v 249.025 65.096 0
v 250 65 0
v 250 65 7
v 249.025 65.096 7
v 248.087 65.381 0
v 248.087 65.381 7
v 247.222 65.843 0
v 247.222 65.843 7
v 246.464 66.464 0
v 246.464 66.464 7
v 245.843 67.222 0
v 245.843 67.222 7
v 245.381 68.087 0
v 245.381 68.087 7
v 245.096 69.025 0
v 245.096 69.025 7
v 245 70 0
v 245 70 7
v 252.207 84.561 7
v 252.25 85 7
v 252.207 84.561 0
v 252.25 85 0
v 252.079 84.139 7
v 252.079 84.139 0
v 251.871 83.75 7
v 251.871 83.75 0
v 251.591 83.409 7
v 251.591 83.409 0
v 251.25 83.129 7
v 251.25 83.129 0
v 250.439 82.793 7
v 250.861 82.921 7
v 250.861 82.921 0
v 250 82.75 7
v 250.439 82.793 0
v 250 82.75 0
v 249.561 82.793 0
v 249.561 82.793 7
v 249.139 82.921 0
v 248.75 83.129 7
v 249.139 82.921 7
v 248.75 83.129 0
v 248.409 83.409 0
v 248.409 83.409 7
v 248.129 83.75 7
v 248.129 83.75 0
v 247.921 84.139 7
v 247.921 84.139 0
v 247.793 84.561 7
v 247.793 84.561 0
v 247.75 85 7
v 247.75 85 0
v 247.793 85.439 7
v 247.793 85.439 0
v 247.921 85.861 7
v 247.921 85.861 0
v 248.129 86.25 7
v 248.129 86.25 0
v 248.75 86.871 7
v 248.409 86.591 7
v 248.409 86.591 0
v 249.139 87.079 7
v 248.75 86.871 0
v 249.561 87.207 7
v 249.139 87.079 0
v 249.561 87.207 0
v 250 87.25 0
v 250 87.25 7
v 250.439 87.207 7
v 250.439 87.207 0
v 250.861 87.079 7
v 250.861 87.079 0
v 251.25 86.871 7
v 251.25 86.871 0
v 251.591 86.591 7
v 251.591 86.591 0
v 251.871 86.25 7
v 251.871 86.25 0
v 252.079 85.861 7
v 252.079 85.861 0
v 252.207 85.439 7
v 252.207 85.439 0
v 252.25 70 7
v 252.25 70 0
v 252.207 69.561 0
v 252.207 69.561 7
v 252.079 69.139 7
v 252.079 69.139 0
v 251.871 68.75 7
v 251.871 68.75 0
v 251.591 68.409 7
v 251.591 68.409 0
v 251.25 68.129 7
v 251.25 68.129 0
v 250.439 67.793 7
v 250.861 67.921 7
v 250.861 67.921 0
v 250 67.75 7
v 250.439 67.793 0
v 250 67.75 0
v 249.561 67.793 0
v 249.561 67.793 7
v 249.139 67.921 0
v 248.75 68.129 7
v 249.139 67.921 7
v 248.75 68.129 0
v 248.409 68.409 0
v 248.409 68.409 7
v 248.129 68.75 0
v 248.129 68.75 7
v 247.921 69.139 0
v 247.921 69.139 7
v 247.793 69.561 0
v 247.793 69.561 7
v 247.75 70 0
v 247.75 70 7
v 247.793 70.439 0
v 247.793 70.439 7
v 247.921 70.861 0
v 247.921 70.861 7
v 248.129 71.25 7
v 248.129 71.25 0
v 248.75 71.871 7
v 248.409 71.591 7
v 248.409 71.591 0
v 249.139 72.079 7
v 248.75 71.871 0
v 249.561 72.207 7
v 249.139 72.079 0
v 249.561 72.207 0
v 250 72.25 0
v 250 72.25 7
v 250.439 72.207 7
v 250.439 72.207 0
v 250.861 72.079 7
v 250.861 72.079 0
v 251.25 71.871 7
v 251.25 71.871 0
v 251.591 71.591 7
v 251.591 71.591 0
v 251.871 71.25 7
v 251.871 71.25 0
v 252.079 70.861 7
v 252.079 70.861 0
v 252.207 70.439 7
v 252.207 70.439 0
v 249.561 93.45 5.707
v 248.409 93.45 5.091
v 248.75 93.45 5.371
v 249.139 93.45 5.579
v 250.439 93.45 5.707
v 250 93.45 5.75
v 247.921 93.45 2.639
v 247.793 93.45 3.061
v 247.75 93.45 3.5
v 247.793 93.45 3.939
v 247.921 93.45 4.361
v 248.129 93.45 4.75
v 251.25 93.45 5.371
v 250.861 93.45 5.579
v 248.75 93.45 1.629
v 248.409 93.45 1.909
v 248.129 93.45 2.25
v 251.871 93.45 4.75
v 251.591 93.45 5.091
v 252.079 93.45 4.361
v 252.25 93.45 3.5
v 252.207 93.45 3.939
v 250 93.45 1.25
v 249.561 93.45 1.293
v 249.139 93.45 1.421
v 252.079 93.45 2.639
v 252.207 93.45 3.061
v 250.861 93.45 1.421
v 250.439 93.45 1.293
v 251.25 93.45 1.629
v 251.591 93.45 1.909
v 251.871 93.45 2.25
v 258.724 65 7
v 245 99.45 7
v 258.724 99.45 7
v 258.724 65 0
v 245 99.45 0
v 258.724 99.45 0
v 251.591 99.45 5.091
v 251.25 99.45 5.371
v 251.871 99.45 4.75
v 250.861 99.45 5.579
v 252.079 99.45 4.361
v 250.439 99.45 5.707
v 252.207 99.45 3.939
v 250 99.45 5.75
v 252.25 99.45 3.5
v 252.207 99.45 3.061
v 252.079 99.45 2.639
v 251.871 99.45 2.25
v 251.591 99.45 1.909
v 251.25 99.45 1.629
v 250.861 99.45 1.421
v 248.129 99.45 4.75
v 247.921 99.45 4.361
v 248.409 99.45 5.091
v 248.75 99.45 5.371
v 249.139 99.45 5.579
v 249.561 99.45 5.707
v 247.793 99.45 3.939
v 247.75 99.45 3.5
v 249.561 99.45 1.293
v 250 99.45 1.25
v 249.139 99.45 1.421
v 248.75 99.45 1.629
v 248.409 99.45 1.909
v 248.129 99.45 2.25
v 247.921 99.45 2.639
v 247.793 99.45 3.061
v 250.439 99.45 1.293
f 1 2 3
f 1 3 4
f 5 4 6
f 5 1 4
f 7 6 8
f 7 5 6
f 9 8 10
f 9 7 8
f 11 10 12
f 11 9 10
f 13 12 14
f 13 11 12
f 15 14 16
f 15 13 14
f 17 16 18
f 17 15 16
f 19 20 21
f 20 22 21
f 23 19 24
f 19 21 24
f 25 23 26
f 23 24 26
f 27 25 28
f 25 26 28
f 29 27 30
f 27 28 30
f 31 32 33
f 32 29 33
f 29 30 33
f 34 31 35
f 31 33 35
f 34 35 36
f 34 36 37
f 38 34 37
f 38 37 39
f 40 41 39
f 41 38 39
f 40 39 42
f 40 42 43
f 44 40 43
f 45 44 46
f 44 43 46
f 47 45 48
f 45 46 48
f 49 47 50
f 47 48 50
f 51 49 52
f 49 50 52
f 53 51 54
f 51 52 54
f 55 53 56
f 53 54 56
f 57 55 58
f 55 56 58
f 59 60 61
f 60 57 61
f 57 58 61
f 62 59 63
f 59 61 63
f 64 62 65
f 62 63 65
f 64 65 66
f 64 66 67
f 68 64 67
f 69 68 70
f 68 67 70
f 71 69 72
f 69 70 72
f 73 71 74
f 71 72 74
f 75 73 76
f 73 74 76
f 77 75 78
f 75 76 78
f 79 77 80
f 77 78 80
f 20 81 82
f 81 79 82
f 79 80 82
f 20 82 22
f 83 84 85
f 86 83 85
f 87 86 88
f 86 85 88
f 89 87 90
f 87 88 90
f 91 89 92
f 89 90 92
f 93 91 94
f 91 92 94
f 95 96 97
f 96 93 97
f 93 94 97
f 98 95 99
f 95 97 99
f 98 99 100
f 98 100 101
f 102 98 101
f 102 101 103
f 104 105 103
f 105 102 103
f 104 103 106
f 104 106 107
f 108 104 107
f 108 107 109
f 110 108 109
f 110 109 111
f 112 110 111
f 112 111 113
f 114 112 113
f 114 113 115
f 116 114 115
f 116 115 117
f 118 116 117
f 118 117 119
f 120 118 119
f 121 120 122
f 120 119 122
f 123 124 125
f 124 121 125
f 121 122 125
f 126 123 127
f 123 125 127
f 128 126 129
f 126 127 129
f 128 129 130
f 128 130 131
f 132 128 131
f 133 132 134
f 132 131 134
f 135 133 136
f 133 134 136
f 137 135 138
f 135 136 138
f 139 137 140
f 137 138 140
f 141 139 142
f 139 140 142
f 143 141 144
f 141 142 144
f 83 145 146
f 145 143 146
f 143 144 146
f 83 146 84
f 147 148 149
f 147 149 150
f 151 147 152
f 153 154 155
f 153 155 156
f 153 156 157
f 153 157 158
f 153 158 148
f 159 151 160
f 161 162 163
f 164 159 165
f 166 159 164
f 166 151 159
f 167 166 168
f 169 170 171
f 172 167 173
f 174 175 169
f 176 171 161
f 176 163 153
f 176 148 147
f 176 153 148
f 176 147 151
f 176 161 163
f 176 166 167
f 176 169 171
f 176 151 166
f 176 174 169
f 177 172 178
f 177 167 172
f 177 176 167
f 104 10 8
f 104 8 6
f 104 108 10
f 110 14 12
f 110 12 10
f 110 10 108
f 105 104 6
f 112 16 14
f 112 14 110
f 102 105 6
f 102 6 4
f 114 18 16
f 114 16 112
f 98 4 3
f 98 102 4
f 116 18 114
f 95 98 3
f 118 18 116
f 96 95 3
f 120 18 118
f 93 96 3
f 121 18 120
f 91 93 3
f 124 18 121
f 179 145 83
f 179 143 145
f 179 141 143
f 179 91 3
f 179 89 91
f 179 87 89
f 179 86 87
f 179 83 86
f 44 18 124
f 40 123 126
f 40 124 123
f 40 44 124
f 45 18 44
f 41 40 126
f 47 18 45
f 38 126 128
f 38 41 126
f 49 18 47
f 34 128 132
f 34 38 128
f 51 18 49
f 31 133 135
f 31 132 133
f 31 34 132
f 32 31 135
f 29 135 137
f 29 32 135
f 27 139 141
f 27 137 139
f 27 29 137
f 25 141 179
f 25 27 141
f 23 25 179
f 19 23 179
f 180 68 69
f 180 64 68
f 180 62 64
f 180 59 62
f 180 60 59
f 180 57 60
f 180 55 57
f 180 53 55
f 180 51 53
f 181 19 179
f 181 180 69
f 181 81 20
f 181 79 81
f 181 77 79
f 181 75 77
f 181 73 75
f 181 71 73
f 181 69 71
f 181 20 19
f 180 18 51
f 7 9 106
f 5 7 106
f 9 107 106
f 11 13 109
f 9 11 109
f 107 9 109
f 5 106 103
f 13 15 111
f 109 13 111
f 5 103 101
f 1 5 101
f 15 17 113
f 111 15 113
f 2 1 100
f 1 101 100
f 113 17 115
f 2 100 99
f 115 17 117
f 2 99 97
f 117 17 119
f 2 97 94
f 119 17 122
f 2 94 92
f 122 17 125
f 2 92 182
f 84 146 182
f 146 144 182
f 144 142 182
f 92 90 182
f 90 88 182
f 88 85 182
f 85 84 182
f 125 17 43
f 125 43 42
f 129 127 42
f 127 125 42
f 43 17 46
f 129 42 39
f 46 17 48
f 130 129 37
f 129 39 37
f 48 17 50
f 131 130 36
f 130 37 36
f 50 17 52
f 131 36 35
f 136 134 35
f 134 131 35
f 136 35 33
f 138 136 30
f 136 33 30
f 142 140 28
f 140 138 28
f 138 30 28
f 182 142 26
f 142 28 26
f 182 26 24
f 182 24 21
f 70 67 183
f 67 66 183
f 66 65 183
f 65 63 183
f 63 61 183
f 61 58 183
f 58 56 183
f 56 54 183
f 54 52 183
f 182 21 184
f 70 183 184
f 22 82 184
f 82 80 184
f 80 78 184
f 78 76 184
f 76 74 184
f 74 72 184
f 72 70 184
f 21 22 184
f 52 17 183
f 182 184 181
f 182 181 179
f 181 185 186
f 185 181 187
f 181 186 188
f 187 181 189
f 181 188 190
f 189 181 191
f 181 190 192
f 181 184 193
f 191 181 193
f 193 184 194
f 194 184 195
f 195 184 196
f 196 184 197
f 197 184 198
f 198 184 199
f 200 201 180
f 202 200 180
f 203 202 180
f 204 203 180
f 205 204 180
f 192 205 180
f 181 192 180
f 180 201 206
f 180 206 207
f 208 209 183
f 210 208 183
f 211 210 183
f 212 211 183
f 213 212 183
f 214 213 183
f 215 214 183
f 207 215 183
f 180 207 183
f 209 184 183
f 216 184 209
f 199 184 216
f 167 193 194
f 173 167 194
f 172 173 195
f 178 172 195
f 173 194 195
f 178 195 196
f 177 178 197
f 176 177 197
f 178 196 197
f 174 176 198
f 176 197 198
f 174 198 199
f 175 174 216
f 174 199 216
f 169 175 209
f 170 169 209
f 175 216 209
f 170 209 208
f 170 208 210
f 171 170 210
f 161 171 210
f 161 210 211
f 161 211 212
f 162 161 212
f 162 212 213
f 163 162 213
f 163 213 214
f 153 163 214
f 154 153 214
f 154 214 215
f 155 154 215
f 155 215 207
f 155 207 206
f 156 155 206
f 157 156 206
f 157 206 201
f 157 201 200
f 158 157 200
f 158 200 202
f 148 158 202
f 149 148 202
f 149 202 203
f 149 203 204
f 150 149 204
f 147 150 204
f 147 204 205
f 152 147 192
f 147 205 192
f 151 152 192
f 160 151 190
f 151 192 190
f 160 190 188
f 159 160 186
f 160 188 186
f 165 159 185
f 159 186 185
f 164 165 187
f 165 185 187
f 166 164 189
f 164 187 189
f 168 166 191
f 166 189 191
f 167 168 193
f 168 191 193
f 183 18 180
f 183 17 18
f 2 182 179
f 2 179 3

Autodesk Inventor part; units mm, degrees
ref_plane "YZ Plane" through (0, 0, 0) normal (1, 0, 0) x (0, 1, 0)
ref_plane "XZ Plane" through (0, 0, 0) normal (0, 1, 0) x (-1, 0, 0)
ref_plane "XY Plane" through (0, 0, 0) normal (0, 0, 1) x (1, 0, 0)
sketch "スケッチ1" plane through (0, 0, 0) normal (0, 0, 1) x (1, 0, 0)
  circle A0 centre (250, 70) radius 2.1 construction
  circle A1 centre (250, 85) radius 2.1 construction
  line L0 (258.724, 99.45) -> (245, 99.45) projected
  arc A2 (245, 70) -> (250, 65) centre (250, 70) ccw
  line L1 (245, 70) -> (245, 99.45)
  line L2 (258.724, 99.45) -> (258.724, 65)
  line L3 (258.724, 65) -> (250, 65)
  circle A3 centre (250, 70) radius 2.25
  circle A4 centre (250, 85) radius 2.25
  point P0 (0, 0)
  dimension "d0" = 4.5
extrude "押し出し1" add sketch "スケッチ1" along normal blind 7
sketch "スケッチ2" plane through (245, 99.45, 0) normal (0, 1, 0) x (1, 0, 0)
  circle A0 centre (5, -3.5) radius 1.65 construction
  circle A1 centre (5, -3.5) radius 2.25
  point P0 (-245, 0)
  dimension "d3" = 4.5
extrude "押し出し2" cut sketch "スケッチ2" against normal blind 6
properties part number "pci_slot_adapter_04"
